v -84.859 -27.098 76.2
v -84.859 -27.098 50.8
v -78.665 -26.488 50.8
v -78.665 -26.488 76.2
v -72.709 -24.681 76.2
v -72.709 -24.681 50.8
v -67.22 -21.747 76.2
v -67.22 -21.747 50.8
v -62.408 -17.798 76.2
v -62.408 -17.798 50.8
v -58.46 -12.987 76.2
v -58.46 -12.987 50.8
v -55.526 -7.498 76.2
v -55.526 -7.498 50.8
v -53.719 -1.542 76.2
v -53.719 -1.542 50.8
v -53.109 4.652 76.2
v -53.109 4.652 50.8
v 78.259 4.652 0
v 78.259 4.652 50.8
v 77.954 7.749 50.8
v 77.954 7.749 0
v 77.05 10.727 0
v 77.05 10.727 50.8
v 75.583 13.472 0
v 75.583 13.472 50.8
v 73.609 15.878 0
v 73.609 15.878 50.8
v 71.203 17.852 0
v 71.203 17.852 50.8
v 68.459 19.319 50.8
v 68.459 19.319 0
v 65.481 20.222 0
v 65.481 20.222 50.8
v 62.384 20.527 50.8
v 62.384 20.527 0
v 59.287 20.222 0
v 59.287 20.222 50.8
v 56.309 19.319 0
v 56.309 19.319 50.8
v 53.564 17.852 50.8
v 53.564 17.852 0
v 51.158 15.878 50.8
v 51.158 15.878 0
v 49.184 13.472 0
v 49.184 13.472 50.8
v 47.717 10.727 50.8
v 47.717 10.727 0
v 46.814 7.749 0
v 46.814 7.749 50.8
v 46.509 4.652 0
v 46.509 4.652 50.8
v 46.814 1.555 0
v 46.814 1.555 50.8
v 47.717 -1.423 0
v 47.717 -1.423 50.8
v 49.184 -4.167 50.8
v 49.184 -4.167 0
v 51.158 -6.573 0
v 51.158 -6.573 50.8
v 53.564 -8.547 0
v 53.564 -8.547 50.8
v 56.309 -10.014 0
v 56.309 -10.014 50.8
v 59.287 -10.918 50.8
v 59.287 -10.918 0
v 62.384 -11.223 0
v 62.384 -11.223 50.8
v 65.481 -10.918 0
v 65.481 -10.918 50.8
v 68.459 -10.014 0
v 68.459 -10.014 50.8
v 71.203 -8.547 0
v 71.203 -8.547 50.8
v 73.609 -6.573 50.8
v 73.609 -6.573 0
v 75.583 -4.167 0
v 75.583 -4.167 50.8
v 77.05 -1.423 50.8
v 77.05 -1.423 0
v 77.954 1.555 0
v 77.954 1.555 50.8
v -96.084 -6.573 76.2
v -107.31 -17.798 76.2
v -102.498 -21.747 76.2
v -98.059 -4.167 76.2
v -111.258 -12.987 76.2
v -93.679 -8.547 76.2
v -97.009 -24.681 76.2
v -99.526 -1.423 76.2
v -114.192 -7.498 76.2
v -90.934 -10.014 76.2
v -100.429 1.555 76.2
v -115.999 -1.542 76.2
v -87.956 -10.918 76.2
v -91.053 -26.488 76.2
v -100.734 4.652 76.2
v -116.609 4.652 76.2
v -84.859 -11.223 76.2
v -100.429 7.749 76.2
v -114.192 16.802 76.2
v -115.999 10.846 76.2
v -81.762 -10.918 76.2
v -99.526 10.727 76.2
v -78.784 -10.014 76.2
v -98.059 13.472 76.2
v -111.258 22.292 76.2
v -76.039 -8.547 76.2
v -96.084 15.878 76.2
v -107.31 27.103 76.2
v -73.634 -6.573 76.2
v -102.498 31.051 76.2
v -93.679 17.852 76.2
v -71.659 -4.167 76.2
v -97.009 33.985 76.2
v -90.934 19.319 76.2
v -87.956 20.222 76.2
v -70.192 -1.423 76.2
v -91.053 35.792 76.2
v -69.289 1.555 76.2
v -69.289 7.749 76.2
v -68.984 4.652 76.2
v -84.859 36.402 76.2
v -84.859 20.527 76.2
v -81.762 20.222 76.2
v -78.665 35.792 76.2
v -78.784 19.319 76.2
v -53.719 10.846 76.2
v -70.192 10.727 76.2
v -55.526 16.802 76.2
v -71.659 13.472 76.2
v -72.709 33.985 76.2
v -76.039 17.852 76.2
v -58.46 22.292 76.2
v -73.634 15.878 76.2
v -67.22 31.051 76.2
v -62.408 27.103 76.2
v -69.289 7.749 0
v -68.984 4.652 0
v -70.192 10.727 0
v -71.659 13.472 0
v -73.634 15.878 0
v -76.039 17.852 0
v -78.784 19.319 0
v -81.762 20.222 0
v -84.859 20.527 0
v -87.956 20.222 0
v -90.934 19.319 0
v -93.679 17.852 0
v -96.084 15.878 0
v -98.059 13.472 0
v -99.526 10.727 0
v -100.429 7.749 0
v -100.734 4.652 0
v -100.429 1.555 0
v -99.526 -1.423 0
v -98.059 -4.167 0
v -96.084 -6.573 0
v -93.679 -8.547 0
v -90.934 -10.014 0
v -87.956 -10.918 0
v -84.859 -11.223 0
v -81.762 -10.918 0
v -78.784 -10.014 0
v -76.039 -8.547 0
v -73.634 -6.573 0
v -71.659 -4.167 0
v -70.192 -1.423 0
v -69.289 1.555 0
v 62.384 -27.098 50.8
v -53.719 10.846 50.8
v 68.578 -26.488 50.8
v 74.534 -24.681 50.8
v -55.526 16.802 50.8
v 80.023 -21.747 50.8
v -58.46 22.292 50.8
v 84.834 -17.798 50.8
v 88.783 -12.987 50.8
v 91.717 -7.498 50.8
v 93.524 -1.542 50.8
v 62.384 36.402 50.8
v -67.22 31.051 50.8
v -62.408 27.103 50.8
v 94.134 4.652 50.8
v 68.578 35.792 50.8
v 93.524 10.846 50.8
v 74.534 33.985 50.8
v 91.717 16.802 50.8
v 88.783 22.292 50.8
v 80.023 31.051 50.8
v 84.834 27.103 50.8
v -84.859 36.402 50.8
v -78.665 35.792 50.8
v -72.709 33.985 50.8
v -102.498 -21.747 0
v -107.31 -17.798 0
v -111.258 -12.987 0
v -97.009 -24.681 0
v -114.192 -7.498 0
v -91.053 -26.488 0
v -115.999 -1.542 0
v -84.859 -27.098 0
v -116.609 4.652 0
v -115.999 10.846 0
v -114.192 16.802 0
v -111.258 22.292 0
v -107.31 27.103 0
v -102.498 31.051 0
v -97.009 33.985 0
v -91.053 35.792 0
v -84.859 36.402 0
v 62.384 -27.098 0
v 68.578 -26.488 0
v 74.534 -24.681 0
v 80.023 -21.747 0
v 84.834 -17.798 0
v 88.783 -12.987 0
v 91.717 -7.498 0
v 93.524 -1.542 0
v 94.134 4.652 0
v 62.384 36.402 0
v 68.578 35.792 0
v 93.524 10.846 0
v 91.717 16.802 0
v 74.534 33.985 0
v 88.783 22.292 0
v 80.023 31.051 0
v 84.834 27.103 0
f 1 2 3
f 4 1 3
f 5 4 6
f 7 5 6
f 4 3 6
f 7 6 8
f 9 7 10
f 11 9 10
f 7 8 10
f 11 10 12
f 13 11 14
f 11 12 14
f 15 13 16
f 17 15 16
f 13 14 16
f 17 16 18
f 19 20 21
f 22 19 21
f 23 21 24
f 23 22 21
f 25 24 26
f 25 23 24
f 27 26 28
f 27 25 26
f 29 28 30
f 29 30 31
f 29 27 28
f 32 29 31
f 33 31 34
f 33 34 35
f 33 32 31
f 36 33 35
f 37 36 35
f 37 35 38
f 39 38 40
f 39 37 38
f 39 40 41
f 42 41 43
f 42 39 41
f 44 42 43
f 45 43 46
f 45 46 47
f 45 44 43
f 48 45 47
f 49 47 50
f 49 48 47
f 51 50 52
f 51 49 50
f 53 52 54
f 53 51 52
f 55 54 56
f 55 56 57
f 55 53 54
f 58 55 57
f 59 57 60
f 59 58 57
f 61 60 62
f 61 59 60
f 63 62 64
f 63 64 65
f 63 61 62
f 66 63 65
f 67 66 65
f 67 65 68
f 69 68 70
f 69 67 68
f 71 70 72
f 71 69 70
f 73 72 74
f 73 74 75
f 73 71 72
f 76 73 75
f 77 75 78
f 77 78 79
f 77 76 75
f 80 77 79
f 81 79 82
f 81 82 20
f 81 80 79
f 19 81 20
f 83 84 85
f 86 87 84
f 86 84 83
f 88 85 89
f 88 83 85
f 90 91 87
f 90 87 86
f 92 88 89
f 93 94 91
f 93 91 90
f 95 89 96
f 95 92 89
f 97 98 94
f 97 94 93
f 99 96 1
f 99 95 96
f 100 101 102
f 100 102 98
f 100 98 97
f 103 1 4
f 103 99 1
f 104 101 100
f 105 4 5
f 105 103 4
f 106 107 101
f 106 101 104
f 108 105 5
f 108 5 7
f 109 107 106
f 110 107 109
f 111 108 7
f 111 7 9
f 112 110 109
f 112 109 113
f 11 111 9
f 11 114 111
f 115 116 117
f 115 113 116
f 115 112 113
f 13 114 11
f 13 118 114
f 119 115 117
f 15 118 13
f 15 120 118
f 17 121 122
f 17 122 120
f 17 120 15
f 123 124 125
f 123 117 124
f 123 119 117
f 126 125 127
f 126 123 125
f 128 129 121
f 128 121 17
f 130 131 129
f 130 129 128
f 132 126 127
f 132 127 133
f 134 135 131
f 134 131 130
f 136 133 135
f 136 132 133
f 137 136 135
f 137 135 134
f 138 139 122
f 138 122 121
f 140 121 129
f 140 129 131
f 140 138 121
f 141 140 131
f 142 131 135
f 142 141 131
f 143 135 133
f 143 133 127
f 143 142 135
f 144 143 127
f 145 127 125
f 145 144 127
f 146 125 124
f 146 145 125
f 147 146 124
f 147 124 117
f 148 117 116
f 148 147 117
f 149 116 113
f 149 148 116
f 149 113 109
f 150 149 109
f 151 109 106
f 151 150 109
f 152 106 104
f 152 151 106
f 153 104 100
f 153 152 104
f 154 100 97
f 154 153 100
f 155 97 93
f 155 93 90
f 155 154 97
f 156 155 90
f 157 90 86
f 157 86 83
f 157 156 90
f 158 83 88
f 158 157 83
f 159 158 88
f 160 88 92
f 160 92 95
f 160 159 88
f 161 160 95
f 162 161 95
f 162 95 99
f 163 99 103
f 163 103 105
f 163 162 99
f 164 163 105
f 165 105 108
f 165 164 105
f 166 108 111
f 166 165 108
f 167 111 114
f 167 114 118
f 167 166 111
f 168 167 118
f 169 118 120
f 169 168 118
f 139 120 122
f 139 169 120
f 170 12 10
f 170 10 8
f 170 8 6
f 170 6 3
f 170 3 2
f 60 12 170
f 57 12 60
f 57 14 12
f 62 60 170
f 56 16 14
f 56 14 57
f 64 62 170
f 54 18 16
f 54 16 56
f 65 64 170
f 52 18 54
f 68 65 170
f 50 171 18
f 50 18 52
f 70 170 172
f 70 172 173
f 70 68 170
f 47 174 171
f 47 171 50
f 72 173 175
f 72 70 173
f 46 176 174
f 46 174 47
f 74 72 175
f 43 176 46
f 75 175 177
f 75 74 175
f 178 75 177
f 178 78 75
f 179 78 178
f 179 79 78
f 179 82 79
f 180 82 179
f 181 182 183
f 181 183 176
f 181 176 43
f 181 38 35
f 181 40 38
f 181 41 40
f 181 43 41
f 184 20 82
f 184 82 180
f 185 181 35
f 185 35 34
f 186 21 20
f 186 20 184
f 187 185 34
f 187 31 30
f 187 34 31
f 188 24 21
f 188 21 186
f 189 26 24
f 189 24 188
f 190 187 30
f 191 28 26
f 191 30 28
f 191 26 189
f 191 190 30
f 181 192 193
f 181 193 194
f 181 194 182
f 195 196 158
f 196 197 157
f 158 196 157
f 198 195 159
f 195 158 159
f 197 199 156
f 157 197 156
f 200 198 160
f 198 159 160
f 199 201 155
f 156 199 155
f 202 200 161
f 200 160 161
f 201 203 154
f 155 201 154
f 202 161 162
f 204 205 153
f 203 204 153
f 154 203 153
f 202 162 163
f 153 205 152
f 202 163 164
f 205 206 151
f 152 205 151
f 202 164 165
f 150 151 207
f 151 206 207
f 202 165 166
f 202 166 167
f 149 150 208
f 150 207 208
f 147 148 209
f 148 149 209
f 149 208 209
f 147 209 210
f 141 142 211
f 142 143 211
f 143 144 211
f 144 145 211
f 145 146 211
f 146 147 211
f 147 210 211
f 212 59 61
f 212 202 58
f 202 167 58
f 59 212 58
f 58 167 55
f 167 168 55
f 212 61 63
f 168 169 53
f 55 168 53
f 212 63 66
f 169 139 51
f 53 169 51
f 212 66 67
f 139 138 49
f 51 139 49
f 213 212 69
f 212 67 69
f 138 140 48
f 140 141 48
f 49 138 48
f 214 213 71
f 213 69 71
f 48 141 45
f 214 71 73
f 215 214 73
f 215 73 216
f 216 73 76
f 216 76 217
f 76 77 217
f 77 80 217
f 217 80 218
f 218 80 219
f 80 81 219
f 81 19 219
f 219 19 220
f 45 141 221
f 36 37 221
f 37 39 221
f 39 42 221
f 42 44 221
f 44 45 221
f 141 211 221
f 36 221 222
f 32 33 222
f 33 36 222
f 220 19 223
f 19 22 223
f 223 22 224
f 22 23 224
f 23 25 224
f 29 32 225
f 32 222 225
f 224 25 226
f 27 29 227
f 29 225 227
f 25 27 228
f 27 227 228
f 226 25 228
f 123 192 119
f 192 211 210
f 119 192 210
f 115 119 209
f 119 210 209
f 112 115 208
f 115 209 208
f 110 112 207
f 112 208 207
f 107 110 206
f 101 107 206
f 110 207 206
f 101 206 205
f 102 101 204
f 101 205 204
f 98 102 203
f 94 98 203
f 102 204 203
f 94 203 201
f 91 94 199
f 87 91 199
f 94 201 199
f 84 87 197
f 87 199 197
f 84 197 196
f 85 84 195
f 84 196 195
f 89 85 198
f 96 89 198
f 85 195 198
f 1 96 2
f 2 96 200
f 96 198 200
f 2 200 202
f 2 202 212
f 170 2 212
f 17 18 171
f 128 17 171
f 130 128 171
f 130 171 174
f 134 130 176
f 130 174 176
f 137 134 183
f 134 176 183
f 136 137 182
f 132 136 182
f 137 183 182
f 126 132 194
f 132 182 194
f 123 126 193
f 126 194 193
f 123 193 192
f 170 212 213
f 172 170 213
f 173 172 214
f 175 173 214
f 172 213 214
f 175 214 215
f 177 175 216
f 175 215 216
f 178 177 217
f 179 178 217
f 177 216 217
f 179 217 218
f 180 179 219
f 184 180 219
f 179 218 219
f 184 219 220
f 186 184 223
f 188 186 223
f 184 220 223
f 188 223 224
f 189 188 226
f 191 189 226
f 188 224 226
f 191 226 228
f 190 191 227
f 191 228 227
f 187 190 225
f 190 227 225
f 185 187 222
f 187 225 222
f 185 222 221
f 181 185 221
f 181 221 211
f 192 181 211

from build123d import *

# Parameters (mm, degrees)
F0_R     = 15.875
F1_DEPTH = 50.8
F2_DEPTH = 76.2


with BuildPart() as f1:
    # F0 (on Top) → F1 (new body)
    with BuildSketch(Plane.XY):
        with BuildLine():
            Line((-11.237637, 36.40228), (-84.859044, 36.40228))
            ThreePointArc((-84.859044, 36.40228), (-62.408403, 27.10292), (-53.109044, 4.65228))
            ThreePointArc((-53.109044, 4.65228), (-62.408403, -17.79836), (-84.859044, -27.09772))
            Line((-84.859044, -27.09772), (-11.237637, -27.09772))
            Line((-11.237637, -27.09772), (62.38377, -27.09772))
            ThreePointArc((62.38377, -27.09772), (94.13377, 4.65228), (62.38377, 36.40228))
            Line((62.38377, 36.40228), (-11.237637, 36.40228))
        make_face()
        with Locations((62.38377, 4.65228)):
            Circle(F0_R, mode=Mode.SUBTRACT)
    extrude(amount=F1_DEPTH)

    # F0 (on Top) → F2 (join)
    with BuildSketch(Plane.XY):
        with BuildLine():
            ThreePointArc((-53.109044, 4.65228), (-62.408403, 27.10292), (-84.859044, 36.40228))
            ThreePointArc((-84.859044, 36.40228), (-116.609044, 4.65228), (-84.859044, -27.09772))
            ThreePointArc((-84.859044, -27.09772), (-62.408403, -17.79836), (-53.109044, 4.65228))
        make_face()
        with Locations((-84.859044, 4.65228)):
            Circle(F0_R, mode=Mode.SUBTRACT)
    extrude(amount=F2_DEPTH)


solid = f1.part
